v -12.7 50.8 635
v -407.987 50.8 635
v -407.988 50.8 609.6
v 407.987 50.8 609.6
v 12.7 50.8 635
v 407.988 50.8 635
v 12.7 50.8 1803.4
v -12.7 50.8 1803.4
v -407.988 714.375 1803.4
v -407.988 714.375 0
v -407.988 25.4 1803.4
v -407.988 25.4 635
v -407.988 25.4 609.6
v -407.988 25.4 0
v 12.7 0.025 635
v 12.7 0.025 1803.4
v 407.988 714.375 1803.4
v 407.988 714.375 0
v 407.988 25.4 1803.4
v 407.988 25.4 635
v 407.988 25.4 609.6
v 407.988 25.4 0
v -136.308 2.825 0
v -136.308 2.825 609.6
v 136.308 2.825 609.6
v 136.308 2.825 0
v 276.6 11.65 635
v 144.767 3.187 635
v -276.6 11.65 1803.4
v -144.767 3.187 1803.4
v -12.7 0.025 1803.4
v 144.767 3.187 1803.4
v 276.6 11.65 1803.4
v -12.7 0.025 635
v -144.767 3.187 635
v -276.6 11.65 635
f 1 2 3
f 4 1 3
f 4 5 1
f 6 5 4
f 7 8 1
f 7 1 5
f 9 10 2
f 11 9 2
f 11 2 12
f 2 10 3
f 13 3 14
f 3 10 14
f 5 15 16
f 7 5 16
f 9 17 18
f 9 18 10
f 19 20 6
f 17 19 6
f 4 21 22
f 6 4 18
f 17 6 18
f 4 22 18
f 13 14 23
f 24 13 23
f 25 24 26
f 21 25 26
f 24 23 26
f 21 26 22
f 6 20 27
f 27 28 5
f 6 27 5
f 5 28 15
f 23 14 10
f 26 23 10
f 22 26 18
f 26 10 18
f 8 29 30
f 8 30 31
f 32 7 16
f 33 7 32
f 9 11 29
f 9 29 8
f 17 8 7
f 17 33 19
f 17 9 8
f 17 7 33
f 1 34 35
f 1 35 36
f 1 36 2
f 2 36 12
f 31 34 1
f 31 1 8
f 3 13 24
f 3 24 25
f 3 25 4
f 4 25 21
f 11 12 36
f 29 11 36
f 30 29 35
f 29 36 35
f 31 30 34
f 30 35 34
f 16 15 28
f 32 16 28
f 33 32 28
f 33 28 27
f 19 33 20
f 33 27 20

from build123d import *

# Parameters (mm, degrees)
F1_DEPTH = 1803.4
F4_DEPTH = 50.8
F3_W     = 25.4
F3_H     = 2540
F5_DEPTH = 50.8


with BuildPart() as f1:
    # F0 (on Top) → F1 (new body)
    with BuildSketch(Plane.XY):
        with BuildLine():
            Line((407.9875, 714.375), (-407.9875, 714.375))
            Line((-407.9875, 714.375), (-407.9875, 25.4))
            ThreePointArc((-407.9875, 25.4), (0, 0), (407.9875, 25.4))
            Line((407.9875, 25.4), (407.9875, 714.375))
        make_face()
    extrude(amount=F1_DEPTH)

    # F2 (on Front) → F4 (cut)
    with BuildSketch(Plane.XZ):
        Polygon((-635, 635), (-635, 609.6), (0, 609.6), (635, 609.6), (635, 635), align=None)
    extrude(amount=-F4_DEPTH, mode=Mode.SUBTRACT)

    # F3 (on Front) → F5 (cut)
    with BuildSketch(Plane.XZ):
        with Locations((0, 1879.6)):
            Rectangle(F3_W, F3_H)
    extrude(amount=-F5_DEPTH, mode=Mode.SUBTRACT)


solid = f1.part
